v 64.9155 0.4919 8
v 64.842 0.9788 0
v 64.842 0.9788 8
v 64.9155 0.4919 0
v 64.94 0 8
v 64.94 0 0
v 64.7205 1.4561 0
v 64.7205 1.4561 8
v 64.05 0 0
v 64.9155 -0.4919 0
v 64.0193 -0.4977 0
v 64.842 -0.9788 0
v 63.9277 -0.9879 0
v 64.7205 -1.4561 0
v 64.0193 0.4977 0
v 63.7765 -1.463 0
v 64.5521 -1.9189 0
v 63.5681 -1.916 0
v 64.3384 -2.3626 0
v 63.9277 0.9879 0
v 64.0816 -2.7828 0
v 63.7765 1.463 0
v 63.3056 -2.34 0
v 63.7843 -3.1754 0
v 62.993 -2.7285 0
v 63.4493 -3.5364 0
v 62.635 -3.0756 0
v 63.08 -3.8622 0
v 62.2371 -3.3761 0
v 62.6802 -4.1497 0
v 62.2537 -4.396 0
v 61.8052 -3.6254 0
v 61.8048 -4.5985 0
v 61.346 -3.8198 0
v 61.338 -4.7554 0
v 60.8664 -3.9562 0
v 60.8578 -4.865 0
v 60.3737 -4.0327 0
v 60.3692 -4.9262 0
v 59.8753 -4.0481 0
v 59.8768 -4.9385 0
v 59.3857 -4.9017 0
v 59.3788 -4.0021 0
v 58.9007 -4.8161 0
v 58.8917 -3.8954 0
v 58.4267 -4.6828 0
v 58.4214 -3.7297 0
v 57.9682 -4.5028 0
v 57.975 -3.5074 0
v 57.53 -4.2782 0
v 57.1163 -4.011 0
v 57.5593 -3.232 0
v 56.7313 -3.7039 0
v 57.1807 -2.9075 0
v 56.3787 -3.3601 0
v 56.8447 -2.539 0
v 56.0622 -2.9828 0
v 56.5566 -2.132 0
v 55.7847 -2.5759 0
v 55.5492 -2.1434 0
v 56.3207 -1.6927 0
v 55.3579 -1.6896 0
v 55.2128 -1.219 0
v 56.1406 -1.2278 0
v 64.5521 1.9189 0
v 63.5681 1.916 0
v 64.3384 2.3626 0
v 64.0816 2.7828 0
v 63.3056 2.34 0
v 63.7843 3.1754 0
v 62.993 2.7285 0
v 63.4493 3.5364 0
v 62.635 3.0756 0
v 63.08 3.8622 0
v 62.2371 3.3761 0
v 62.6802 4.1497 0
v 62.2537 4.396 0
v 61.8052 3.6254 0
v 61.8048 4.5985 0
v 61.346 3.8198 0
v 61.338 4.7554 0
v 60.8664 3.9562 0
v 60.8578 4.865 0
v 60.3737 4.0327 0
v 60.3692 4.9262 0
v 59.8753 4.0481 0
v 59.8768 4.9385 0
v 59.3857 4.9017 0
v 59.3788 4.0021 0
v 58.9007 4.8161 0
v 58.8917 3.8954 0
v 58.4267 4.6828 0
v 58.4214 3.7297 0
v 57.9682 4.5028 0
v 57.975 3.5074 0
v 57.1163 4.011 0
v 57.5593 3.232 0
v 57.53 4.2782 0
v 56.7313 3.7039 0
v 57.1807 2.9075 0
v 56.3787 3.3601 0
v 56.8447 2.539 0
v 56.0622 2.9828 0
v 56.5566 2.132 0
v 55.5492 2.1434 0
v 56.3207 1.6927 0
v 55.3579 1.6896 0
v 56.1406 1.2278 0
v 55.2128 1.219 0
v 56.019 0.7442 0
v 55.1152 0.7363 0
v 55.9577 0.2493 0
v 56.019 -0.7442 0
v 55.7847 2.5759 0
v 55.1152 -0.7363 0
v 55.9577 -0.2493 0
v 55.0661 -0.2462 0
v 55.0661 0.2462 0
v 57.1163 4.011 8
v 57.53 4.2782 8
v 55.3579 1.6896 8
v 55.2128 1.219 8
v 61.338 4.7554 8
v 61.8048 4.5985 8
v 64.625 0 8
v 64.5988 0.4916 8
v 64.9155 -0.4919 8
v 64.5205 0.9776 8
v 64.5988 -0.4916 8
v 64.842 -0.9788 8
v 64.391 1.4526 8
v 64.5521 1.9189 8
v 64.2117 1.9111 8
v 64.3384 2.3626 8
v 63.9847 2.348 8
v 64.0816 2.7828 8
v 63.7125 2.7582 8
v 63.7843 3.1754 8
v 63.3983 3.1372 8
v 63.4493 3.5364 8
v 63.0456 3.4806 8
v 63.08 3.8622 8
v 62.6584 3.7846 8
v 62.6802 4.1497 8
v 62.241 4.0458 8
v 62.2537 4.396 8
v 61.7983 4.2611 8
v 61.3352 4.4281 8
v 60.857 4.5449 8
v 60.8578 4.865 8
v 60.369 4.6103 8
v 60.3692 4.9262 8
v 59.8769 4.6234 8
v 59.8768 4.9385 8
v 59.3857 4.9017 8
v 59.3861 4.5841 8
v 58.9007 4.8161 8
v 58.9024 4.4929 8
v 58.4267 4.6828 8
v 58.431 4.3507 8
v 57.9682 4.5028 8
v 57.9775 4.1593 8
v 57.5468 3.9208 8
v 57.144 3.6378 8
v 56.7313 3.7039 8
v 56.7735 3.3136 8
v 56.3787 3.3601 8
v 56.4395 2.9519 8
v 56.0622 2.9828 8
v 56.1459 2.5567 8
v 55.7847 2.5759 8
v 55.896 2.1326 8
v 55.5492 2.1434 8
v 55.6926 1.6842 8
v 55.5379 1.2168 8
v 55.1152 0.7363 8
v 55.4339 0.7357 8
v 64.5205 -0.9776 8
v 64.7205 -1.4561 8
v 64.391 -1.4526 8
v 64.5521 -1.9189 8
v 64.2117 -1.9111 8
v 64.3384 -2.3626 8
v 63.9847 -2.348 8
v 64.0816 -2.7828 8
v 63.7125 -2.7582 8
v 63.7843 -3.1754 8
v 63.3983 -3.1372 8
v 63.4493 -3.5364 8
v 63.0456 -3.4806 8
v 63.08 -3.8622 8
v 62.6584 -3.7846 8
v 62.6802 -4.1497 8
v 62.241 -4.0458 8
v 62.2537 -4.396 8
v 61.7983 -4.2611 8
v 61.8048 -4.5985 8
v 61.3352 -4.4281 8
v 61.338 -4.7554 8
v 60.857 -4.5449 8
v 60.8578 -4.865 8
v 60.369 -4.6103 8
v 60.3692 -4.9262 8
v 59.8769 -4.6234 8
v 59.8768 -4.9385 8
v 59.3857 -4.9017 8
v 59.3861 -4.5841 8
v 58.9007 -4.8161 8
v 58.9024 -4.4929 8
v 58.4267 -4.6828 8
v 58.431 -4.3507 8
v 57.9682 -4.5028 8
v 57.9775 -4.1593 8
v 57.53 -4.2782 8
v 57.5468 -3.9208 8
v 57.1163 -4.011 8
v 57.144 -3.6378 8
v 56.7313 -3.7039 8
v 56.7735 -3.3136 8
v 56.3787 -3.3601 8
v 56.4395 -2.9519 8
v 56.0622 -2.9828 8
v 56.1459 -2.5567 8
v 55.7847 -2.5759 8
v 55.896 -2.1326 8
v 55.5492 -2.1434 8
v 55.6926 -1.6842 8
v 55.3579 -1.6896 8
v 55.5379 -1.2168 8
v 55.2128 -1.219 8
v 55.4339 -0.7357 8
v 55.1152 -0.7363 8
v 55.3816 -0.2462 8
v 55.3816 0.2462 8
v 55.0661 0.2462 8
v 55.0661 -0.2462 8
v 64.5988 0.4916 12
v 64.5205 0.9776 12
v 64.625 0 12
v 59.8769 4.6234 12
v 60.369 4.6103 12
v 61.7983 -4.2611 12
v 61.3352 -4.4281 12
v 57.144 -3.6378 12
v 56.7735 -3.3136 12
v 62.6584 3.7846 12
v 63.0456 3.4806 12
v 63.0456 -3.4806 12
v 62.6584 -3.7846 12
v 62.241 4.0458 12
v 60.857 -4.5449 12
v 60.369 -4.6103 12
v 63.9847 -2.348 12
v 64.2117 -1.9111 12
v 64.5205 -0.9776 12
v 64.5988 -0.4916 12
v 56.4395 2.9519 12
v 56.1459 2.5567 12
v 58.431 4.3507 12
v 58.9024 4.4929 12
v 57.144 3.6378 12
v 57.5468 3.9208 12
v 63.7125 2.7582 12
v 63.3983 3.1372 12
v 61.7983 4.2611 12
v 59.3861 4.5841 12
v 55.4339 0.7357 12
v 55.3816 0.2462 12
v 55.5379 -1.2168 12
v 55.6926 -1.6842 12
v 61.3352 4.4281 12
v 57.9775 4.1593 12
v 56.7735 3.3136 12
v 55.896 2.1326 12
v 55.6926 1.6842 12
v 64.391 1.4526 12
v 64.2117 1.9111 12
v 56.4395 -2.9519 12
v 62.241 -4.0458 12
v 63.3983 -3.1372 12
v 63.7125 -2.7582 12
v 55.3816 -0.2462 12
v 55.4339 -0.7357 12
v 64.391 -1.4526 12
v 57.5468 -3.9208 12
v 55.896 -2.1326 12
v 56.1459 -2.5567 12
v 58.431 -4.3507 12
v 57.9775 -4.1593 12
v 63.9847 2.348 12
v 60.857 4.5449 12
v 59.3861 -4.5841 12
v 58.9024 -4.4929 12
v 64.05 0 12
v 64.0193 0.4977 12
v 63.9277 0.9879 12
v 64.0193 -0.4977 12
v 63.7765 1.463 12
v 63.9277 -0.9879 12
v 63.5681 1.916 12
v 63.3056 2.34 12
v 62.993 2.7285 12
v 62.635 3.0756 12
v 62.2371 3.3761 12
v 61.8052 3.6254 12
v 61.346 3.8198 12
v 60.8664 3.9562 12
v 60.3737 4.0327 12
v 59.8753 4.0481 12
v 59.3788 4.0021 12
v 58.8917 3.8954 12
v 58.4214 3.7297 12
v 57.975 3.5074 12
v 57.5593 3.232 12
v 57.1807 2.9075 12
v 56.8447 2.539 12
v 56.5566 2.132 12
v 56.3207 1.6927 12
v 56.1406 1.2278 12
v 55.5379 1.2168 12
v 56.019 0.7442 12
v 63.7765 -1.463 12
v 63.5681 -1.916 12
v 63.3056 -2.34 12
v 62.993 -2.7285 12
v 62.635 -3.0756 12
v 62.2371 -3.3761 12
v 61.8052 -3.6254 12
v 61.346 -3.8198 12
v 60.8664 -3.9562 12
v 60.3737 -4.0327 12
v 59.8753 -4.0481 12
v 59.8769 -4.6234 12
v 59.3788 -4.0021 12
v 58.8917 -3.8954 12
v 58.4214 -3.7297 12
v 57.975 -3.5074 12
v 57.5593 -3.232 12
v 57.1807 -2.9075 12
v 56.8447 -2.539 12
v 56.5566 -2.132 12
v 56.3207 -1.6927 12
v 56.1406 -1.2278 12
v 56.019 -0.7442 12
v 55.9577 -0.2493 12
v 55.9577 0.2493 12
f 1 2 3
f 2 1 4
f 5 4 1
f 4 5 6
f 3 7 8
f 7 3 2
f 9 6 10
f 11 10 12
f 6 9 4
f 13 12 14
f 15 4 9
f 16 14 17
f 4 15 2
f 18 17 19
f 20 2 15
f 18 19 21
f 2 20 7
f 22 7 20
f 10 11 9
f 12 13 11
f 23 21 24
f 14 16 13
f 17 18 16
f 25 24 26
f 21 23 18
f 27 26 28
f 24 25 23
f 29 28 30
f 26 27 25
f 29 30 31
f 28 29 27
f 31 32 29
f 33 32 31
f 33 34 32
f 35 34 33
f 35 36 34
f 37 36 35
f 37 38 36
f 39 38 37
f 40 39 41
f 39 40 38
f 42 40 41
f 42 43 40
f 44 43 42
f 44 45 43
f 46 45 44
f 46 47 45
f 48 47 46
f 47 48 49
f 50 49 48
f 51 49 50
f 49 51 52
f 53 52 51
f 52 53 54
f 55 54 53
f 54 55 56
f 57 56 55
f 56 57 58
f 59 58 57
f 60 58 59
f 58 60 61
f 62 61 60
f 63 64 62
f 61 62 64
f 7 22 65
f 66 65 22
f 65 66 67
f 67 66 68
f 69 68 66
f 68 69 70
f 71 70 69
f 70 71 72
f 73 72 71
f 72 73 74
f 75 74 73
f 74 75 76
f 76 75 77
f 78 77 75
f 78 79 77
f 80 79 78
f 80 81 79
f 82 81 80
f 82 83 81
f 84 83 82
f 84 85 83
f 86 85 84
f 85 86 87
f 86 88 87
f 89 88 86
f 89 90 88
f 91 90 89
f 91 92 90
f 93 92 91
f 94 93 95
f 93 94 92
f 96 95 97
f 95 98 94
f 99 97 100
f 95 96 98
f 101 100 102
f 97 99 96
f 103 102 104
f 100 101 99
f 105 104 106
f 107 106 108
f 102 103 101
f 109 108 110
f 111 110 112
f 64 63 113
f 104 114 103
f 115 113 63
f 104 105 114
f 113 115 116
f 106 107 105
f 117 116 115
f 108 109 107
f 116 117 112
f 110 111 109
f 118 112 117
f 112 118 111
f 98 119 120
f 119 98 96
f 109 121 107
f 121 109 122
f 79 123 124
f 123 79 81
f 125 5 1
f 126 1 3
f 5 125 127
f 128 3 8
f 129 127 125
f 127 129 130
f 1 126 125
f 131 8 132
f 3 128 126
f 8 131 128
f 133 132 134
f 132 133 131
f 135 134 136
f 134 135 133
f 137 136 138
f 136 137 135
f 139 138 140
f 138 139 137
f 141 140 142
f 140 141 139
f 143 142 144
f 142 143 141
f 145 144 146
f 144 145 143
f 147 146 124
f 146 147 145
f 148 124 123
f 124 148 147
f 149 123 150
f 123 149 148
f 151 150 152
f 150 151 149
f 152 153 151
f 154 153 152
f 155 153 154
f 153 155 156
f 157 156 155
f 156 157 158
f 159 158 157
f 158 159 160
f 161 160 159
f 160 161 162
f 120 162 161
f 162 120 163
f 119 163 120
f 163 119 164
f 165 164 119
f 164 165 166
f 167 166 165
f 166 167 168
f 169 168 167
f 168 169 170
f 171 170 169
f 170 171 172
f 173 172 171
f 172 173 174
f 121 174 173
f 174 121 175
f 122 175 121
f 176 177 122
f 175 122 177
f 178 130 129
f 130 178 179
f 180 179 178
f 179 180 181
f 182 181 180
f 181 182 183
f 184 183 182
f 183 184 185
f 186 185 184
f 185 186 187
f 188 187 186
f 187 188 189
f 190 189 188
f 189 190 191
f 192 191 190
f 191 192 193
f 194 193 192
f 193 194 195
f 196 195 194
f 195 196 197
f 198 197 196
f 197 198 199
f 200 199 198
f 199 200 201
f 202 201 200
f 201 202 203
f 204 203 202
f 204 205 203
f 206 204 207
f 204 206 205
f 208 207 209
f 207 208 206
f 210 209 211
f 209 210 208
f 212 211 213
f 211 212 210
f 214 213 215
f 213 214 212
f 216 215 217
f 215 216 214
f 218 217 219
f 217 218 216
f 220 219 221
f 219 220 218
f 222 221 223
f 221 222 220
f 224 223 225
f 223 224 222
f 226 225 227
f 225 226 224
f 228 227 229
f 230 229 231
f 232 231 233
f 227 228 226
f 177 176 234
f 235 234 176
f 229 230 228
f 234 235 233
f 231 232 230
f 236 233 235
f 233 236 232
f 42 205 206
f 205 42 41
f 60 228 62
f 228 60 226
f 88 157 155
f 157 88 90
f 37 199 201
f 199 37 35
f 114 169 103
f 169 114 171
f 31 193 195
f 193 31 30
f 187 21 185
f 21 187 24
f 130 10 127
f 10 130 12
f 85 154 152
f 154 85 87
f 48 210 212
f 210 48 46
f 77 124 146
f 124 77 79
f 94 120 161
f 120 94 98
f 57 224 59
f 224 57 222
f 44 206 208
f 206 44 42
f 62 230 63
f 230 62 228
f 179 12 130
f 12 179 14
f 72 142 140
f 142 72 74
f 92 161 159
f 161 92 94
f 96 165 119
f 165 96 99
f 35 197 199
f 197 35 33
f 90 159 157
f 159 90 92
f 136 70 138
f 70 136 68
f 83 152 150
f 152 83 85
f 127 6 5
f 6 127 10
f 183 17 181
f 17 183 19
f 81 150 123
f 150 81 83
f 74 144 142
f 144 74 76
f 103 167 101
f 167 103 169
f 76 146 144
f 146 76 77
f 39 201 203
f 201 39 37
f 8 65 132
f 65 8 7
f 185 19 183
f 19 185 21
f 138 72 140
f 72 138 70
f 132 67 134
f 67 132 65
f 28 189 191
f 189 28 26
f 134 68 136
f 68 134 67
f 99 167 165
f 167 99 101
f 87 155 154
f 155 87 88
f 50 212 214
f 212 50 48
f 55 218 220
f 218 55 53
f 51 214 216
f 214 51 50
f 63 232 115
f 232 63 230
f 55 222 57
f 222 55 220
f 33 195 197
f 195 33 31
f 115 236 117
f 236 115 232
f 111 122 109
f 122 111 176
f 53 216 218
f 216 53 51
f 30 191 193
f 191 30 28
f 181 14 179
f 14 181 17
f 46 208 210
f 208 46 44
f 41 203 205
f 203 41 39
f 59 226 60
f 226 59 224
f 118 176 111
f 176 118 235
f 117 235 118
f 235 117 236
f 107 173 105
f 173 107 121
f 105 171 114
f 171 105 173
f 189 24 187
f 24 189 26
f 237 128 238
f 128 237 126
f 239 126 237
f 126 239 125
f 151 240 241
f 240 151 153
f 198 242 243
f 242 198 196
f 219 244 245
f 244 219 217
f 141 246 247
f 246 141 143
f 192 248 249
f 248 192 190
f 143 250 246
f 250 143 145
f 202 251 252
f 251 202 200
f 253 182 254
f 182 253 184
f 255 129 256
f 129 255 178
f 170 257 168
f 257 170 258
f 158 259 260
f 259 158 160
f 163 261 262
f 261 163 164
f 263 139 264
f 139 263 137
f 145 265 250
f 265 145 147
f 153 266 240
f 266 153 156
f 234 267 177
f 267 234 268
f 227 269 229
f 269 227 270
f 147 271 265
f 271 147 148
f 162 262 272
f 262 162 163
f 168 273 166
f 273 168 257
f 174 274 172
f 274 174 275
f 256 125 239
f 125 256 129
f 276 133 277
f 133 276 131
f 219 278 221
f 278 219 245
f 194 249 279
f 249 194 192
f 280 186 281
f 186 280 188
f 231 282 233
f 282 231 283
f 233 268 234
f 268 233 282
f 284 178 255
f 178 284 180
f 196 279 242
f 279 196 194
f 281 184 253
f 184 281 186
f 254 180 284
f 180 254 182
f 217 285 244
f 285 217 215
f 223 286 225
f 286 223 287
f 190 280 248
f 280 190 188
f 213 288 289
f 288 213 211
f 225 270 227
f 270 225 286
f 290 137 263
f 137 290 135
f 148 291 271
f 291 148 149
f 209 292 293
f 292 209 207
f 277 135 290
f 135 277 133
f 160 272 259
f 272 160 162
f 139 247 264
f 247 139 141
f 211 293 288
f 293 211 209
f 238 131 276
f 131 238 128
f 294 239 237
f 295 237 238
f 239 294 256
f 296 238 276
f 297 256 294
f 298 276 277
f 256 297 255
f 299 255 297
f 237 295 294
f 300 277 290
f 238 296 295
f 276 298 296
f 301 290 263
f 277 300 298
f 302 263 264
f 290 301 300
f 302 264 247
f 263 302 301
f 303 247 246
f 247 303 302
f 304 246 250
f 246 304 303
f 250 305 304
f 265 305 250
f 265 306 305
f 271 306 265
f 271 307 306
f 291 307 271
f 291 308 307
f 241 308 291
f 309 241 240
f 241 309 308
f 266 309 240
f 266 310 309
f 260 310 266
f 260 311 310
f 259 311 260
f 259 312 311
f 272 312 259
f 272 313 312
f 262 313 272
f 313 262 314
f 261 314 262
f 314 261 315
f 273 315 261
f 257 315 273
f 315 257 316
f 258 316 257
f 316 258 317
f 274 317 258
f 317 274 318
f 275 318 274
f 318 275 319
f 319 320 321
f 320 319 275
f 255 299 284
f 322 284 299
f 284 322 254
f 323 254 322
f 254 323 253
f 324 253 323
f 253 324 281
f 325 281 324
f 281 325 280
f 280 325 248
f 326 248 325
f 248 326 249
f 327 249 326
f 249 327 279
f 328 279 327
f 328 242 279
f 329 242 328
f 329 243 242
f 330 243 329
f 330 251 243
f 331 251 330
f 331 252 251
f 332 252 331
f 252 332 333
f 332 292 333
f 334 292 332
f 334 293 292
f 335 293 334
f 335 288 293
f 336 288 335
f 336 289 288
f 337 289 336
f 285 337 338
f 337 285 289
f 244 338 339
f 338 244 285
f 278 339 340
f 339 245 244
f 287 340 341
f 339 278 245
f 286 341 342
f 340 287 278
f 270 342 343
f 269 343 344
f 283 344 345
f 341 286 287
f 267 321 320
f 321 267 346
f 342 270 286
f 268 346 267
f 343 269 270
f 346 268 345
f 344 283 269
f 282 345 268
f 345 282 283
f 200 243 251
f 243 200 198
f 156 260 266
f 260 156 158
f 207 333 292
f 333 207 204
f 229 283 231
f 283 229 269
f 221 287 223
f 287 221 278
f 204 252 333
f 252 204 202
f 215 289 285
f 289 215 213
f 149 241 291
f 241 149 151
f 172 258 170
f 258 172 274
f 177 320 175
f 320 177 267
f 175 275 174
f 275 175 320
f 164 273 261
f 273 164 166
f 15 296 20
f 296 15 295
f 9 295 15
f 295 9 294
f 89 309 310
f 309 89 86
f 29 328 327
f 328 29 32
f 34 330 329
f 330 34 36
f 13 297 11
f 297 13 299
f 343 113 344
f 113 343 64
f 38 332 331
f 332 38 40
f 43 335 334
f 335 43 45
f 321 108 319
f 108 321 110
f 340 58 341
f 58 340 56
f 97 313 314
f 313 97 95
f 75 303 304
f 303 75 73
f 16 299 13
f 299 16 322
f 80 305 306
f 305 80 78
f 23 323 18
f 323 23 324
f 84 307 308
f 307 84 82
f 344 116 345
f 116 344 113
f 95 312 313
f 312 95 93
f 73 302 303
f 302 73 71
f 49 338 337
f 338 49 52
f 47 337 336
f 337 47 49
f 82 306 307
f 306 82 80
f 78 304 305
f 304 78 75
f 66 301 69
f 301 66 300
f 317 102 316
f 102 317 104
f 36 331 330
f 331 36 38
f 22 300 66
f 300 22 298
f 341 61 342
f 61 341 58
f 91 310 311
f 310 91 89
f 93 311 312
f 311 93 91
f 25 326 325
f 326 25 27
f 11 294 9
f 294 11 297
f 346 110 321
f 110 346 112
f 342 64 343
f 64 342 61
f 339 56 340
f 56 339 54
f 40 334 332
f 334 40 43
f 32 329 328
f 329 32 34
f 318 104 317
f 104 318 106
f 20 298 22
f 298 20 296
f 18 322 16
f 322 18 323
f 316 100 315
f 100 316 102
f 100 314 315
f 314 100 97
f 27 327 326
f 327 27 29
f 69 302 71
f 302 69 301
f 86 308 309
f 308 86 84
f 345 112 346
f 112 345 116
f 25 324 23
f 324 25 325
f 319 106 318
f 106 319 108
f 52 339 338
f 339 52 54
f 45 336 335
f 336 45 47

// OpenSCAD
// file: ../../Hardware.scad
// Dimensions of metal bits

bearing_od = 22.00 - 0.04;  // Interference fit!
bearing_id = 8.00;
bearing_depth = 7;


// TODO Need an offset more than a scale factor, for small stuff!
nail_16d_diam = 4.16;  // Drill #19 for moderately loose.
nail_6d_diam = 2.92;    // Drill #32 for moderately loose. Add .05 for moderately loose.

m5_male_dia = 4.92;  // Drill #12 D_maj - H/4 = D_maj - .2165 P
m5_minor_dia = 5 * 1.08253*0.8; // 4.13 = (D_maj - 1.25*0.866*P)
m5_nut_dia = 7.89;  // hex flats
m5_boss_diam = 12;
m5_boss_thick = 6;
m5_nut_recess = 3.7 + 0.2;  // nut thickness
m5_spacer_diam = 9;
// file: ../../Utilities.scad
/*


module ring(outerRadius,innerRadius,thickness,outerSegment=30,innerSegment=30)
	creates a hollow cylinder centered at origin
		outerRadius and innerRadius should be self-explanatory
		thickess is along z
		outerSegment is an optional override of the system variable $fn
		innerSegment is an optional override of the system variable $fn


*/

module ring(
	outerRadius,
	innerRadius,
	thickness,
	outerSegment=30,
	innerSegment=30)
{
	difference() // hollows out the center of one cylinder with another, smaller one
	{
		cylinder(thickness,outerRadius,outerRadius,$fn=outerSegment);
		translate([0,0,-1])
		cylinder(thickness+2,innerRadius,innerRadius,,$fn=innerSegment);
	}
}

module draw_bosses(centres, diam, h)
{
    // Draw a boss around every hole
    for(i = [0:1:len(centres)-1])
    {
        translate(centres[i])
        cylinder(d=diam, h=h);
    }
}

// Use this inside a difference()
module thru_drill(centres, diams, drill_depth = 100)
{
    assert(len(centres) == len(diams));
    n = min( len(centres), len(diams) );
    for(i = [0:1:n-1])
    {
        translate(concat(centres[i], -drill_depth))
        cylinder(d=diams[i], h=2*drill_depth);
    }
}

// Draw the head of zero or more hex fasteners
// Use this within an intersection
module captive_nuts(holes, flat_diam, thick)
{
    for(hole = holes)
    {
        translate(hole)
        cylinder(d=flat_diam/sin(60), h=thick, $fn=6);
    }
}

function bounding_box_2d(pts) = 
[
    [
        min( [ for(i = [0:1:len(pts)-1]) pts[i][0] ] ),
        min( [ for(i = [0:1:len(pts)-1]) pts[i][1] ] )
    ],[
        max( [ for(i = [0:1:len(pts)-1]) pts[i][0] ] ),
        max( [ for(i = [0:1:len(pts)-1]) pts[i][1] ] )
    ],
];
// file: ../../Locations.scad
include <Hardware.scad>

movemt_corner_holes = [
    [-40, +97],         // upper left
    [+40, +72],         // upper right        
    [+40, -10],         // lower right
    [-40, -10],         // lower left
];

movemt_corner_holes_diam = [
    m5_male_dia,m5_male_dia,
    m5_male_dia,m5_male_dia,
];

outer_corner_holes = [
    [-60, +122],        // upper left
    [+60, +122],        // upper right        
    [+60, -23],         // lower right
    [-60, -23],         // lower left
];
outer_corner_holes_diam = [
    m5_male_dia,m5_male_dia,
    m5_male_dia,m5_male_dia,
];

escape_axle_posn = [  0,       72];
pendulum_axle_posn = [  0,  122.28];

// For all frame components
thick = 2.5;
arm_width = 8;
bearing_boss_diam = 32;
minshaft_bore_diam = 8.01;  // Loose fit!
minshaft_boss_diam = 16;
girder_thick = 1.2; // six layers at 0.2mm/layer
small_arm_width = 5;  // For small girders
small_arm_height = 4;

// Ratchet, barrel,pulley arbor, face frame
barrel_bore_diam = 10;
pulley_hex_diam = 8;

// Quality settings
$fs = 0.5;
$fa = 5;
// main file
// Create a spoked gear with a ratchet nested inside.

use <MCAD/involute_gears.scad>
include <../../Locations.scad>
use <../../Utilities.scad>

gear_height = 8;
ratchet_height = 5;
ratchet_diam = 40;
spokes_diam = 35;
hub_diam = 15;
ratchet_hex_diam = 8 / sin(60);  // Shared with Face.scad !!

num_teeth = 30;
NATIVE_RADIUS = 52;
TEETH_PAWL_RATIO = 5;

// For arbor length
faceframethick = 4;
faceframegap = 5;
arbor_len5 = gear_height - ratchet_height + faceframegap + faceframethick;
arbor_diam5 = 8;
arbor_rear_sleeve_len = bearing_depth;
arbor_rear_sleeve_diam = 6;

{//rotate([90,0,0]) {
    //arbor();
    //translate([30,0])
    //arbor_front_sleeve();
    
    //Hack front arbor
    translate([60,0])
    difference()
    {
        // 2020-Oct: Test in PLA:
        // Arbor 8 mm outer dia prints as 7.94 mm
        // Sleeve 9.95 mm round prints as 9.90 mm
        union()
        {
            arbor_len5a = gear_height - ratchet_height + faceframegap;
            cylinder(d=9.88, h=arbor_len5a);  // Loose
            
            translate([0,0,arbor_len5a-.01])
            cylinder(d=9.25, h=arbor_len5 - arbor_len5a+.01);  // Loose
        }
        cylinder(d=arbor_diam5 + .10, h = 3*arbor_len5, center = true);
    }    
    //translate([60,0])
    //arbor_rear_sleeve();
}
//barrel();
//ratchet_teeth(ratchet_diam, 2*ratchet_height,true);

//rotate([0,0,0.05]) translate([0,0,gear_height])
//ratchet();

module ratchet()
{
    linear_extrude(ratchet_height)
    difference()
    {
        ratchet2d(ratchet_diam, is_clockwise=true);
        circle(d=ratchet_hex_diam, $fn=6);
    }
}

module barrel()
{
    difference()
    {
        difference()
        {
            // Solid gear
            linear_extrude(height = gear_height)
            gear(number_of_teeth=48, circular_pitch=1 * 180,
                //circles=6,
                flat=true,
                rim_thickness = 1,
                //rim_width=2,
                gear_thickness = 1,
                hub_thickness = 1,
                //hub_diameter=0,
                bore_diameter=0,
                clearance = 0.25,  // ISO metric root
                pressure_angle=20);

            // Cut out the ratchet teeth from inside the barrel.
            translate([0,0,gear_height - ratchet_height])
            scale([1,1])
            ratchet_teeth(ratchet_diam, 2*ratchet_height,true);

            // Cut out the spokes but leave the hub
            difference()
            {
                // Negative cylinder for spokes
                cylinder(h=3*gear_height, center = true, d=spokes_diam);
                // Cut out spokes from this cylinder
                spokes(spokes_diam=spokes_diam+.05, hub_diam=0, height = 3*gear_height, width=3, num_spokes=5, center=true);
                // Hub
                cylinder(h=gear_height-ratchet_height+1/*avoid coplanar*/, d=hub_diam);
            }
        }
        // Hub bore
        cylinder(h=3*gear_height, d=barrel_bore_diam, center=true);
    }
}

module ratchet2d(ratchet_diam, is_clockwise)
{
    // |\      Radial edge approx 5.1 units long.
    // | \     Tooth tip is at r=55, 3 units away from the r=52 circle.
    // |  \
    // -----
    factor =  ratchet_diam / NATIVE_RADIUS / 2;
    //linear_extrude(ratchet_height, center = false, convexity=4)
    scale([(is_clockwise?-1:1) * factor,factor])
    {
        circle(r = 19);
        for(i = [0:1:num_teeth/TEETH_PAWL_RATIO])
        {
            rotate([0,0,i*360/num_teeth*TEETH_PAWL_RATIO])
            translate([0,-108,0])
            import(file = "RatchetArm Inkscape.svg");
        }
    }
}

module arbor()
{
    difference()
    {
        union()
        {
            // Rear bearing sleeve hex
            cylinder(h=arbor_rear_sleeve_len, d=arbor_rear_sleeve_diam, $fn=6);
            translate([0,0,arbor_rear_sleeve_len])
            {
                // Weight pulley hex
                len2 = 13;
                cylinder(h=len2, d=8-.02, $fn=6);
                translate([0,0,len2])
                {
                    // Front bearing, round
                    len3 = 7+1;
                    cylinder(h=len3, d=bearing_id);
                    translate([0,0,len3])
                    {
                        // Ratchet hex
                        len4 = ratchet_height + 11;
                        cylinder(h=len4, d=ratchet_hex_diam-.02, $fn=6);
                        translate([0,0,len4])
                        {
                            // Ratchet barrel and face bearing, round
                            cylinder(h=arbor_len5, d=arbor_diam5 - .02);
                        }
                    }
                }
            }
        }
        // Through bore
        cylinder(d=nail_16d_diam+.04, h=1000,center=true);
    }
}

// Ratchet barrel and face bearing, round
module arbor_front_sleeve()
{
    linear_extrude(arbor_len5, center = false, convexity=4)
    difference()
    {
        // 2020-Oct: Test in PLA:
        // Arbor 8 mm outer dia prints as 7.94 mm
        // Sleeve 9.95 mm round prints as 9.90 mm
        circle(d=barrel_bore_diam-.05);  // Loose
        circle(d=arbor_diam5 + .02);
    }
}

// Rear bearing sleeve hex
module arbor_rear_sleeve()
{
    linear_extrude(arbor_rear_sleeve_len, center = false)
    difference()
    {
        // 2020-Oct: Test in PLA:
        // Arbor 8 mm outer round prints as 7.91 mm.
        // Arbor 6 mm outer hex   prints as 6.12 mm edges, 5.60 flats.
        // Sleeve 8.09 mm round outer prints as 8.24 mm.
        circle(d=bearing_id + .09);
        circle(d=arbor_rear_sleeve_diam + .06, $fn=6);
    }
}

// Draw the ratchet teeth inside the barrel that engage the ratchet.
// Use an STL file exported from a mesh in Blender.
module ratchet_teeth(diam, height, is_clockwise)
{
    // |\      Radial edge approx 5.1 units long.
    // | \     Tooth tip is at r=55, 3 units away from the r=52 circle.
    // |  \
    // -----
    linear_extrude(height, center = false, convexity=4)
    {
        factor =  diam / NATIVE_RADIUS / 2;
        circle(d = diam - 1);
        scale([(is_clockwise?-1:1) * factor,factor])
        for(i = [0:1:num_teeth])
        {
            rotate([0,0,i*360/num_teeth])
            projection(cut = false)
            import(file = "Tooth.stl");
        }
    }
}
